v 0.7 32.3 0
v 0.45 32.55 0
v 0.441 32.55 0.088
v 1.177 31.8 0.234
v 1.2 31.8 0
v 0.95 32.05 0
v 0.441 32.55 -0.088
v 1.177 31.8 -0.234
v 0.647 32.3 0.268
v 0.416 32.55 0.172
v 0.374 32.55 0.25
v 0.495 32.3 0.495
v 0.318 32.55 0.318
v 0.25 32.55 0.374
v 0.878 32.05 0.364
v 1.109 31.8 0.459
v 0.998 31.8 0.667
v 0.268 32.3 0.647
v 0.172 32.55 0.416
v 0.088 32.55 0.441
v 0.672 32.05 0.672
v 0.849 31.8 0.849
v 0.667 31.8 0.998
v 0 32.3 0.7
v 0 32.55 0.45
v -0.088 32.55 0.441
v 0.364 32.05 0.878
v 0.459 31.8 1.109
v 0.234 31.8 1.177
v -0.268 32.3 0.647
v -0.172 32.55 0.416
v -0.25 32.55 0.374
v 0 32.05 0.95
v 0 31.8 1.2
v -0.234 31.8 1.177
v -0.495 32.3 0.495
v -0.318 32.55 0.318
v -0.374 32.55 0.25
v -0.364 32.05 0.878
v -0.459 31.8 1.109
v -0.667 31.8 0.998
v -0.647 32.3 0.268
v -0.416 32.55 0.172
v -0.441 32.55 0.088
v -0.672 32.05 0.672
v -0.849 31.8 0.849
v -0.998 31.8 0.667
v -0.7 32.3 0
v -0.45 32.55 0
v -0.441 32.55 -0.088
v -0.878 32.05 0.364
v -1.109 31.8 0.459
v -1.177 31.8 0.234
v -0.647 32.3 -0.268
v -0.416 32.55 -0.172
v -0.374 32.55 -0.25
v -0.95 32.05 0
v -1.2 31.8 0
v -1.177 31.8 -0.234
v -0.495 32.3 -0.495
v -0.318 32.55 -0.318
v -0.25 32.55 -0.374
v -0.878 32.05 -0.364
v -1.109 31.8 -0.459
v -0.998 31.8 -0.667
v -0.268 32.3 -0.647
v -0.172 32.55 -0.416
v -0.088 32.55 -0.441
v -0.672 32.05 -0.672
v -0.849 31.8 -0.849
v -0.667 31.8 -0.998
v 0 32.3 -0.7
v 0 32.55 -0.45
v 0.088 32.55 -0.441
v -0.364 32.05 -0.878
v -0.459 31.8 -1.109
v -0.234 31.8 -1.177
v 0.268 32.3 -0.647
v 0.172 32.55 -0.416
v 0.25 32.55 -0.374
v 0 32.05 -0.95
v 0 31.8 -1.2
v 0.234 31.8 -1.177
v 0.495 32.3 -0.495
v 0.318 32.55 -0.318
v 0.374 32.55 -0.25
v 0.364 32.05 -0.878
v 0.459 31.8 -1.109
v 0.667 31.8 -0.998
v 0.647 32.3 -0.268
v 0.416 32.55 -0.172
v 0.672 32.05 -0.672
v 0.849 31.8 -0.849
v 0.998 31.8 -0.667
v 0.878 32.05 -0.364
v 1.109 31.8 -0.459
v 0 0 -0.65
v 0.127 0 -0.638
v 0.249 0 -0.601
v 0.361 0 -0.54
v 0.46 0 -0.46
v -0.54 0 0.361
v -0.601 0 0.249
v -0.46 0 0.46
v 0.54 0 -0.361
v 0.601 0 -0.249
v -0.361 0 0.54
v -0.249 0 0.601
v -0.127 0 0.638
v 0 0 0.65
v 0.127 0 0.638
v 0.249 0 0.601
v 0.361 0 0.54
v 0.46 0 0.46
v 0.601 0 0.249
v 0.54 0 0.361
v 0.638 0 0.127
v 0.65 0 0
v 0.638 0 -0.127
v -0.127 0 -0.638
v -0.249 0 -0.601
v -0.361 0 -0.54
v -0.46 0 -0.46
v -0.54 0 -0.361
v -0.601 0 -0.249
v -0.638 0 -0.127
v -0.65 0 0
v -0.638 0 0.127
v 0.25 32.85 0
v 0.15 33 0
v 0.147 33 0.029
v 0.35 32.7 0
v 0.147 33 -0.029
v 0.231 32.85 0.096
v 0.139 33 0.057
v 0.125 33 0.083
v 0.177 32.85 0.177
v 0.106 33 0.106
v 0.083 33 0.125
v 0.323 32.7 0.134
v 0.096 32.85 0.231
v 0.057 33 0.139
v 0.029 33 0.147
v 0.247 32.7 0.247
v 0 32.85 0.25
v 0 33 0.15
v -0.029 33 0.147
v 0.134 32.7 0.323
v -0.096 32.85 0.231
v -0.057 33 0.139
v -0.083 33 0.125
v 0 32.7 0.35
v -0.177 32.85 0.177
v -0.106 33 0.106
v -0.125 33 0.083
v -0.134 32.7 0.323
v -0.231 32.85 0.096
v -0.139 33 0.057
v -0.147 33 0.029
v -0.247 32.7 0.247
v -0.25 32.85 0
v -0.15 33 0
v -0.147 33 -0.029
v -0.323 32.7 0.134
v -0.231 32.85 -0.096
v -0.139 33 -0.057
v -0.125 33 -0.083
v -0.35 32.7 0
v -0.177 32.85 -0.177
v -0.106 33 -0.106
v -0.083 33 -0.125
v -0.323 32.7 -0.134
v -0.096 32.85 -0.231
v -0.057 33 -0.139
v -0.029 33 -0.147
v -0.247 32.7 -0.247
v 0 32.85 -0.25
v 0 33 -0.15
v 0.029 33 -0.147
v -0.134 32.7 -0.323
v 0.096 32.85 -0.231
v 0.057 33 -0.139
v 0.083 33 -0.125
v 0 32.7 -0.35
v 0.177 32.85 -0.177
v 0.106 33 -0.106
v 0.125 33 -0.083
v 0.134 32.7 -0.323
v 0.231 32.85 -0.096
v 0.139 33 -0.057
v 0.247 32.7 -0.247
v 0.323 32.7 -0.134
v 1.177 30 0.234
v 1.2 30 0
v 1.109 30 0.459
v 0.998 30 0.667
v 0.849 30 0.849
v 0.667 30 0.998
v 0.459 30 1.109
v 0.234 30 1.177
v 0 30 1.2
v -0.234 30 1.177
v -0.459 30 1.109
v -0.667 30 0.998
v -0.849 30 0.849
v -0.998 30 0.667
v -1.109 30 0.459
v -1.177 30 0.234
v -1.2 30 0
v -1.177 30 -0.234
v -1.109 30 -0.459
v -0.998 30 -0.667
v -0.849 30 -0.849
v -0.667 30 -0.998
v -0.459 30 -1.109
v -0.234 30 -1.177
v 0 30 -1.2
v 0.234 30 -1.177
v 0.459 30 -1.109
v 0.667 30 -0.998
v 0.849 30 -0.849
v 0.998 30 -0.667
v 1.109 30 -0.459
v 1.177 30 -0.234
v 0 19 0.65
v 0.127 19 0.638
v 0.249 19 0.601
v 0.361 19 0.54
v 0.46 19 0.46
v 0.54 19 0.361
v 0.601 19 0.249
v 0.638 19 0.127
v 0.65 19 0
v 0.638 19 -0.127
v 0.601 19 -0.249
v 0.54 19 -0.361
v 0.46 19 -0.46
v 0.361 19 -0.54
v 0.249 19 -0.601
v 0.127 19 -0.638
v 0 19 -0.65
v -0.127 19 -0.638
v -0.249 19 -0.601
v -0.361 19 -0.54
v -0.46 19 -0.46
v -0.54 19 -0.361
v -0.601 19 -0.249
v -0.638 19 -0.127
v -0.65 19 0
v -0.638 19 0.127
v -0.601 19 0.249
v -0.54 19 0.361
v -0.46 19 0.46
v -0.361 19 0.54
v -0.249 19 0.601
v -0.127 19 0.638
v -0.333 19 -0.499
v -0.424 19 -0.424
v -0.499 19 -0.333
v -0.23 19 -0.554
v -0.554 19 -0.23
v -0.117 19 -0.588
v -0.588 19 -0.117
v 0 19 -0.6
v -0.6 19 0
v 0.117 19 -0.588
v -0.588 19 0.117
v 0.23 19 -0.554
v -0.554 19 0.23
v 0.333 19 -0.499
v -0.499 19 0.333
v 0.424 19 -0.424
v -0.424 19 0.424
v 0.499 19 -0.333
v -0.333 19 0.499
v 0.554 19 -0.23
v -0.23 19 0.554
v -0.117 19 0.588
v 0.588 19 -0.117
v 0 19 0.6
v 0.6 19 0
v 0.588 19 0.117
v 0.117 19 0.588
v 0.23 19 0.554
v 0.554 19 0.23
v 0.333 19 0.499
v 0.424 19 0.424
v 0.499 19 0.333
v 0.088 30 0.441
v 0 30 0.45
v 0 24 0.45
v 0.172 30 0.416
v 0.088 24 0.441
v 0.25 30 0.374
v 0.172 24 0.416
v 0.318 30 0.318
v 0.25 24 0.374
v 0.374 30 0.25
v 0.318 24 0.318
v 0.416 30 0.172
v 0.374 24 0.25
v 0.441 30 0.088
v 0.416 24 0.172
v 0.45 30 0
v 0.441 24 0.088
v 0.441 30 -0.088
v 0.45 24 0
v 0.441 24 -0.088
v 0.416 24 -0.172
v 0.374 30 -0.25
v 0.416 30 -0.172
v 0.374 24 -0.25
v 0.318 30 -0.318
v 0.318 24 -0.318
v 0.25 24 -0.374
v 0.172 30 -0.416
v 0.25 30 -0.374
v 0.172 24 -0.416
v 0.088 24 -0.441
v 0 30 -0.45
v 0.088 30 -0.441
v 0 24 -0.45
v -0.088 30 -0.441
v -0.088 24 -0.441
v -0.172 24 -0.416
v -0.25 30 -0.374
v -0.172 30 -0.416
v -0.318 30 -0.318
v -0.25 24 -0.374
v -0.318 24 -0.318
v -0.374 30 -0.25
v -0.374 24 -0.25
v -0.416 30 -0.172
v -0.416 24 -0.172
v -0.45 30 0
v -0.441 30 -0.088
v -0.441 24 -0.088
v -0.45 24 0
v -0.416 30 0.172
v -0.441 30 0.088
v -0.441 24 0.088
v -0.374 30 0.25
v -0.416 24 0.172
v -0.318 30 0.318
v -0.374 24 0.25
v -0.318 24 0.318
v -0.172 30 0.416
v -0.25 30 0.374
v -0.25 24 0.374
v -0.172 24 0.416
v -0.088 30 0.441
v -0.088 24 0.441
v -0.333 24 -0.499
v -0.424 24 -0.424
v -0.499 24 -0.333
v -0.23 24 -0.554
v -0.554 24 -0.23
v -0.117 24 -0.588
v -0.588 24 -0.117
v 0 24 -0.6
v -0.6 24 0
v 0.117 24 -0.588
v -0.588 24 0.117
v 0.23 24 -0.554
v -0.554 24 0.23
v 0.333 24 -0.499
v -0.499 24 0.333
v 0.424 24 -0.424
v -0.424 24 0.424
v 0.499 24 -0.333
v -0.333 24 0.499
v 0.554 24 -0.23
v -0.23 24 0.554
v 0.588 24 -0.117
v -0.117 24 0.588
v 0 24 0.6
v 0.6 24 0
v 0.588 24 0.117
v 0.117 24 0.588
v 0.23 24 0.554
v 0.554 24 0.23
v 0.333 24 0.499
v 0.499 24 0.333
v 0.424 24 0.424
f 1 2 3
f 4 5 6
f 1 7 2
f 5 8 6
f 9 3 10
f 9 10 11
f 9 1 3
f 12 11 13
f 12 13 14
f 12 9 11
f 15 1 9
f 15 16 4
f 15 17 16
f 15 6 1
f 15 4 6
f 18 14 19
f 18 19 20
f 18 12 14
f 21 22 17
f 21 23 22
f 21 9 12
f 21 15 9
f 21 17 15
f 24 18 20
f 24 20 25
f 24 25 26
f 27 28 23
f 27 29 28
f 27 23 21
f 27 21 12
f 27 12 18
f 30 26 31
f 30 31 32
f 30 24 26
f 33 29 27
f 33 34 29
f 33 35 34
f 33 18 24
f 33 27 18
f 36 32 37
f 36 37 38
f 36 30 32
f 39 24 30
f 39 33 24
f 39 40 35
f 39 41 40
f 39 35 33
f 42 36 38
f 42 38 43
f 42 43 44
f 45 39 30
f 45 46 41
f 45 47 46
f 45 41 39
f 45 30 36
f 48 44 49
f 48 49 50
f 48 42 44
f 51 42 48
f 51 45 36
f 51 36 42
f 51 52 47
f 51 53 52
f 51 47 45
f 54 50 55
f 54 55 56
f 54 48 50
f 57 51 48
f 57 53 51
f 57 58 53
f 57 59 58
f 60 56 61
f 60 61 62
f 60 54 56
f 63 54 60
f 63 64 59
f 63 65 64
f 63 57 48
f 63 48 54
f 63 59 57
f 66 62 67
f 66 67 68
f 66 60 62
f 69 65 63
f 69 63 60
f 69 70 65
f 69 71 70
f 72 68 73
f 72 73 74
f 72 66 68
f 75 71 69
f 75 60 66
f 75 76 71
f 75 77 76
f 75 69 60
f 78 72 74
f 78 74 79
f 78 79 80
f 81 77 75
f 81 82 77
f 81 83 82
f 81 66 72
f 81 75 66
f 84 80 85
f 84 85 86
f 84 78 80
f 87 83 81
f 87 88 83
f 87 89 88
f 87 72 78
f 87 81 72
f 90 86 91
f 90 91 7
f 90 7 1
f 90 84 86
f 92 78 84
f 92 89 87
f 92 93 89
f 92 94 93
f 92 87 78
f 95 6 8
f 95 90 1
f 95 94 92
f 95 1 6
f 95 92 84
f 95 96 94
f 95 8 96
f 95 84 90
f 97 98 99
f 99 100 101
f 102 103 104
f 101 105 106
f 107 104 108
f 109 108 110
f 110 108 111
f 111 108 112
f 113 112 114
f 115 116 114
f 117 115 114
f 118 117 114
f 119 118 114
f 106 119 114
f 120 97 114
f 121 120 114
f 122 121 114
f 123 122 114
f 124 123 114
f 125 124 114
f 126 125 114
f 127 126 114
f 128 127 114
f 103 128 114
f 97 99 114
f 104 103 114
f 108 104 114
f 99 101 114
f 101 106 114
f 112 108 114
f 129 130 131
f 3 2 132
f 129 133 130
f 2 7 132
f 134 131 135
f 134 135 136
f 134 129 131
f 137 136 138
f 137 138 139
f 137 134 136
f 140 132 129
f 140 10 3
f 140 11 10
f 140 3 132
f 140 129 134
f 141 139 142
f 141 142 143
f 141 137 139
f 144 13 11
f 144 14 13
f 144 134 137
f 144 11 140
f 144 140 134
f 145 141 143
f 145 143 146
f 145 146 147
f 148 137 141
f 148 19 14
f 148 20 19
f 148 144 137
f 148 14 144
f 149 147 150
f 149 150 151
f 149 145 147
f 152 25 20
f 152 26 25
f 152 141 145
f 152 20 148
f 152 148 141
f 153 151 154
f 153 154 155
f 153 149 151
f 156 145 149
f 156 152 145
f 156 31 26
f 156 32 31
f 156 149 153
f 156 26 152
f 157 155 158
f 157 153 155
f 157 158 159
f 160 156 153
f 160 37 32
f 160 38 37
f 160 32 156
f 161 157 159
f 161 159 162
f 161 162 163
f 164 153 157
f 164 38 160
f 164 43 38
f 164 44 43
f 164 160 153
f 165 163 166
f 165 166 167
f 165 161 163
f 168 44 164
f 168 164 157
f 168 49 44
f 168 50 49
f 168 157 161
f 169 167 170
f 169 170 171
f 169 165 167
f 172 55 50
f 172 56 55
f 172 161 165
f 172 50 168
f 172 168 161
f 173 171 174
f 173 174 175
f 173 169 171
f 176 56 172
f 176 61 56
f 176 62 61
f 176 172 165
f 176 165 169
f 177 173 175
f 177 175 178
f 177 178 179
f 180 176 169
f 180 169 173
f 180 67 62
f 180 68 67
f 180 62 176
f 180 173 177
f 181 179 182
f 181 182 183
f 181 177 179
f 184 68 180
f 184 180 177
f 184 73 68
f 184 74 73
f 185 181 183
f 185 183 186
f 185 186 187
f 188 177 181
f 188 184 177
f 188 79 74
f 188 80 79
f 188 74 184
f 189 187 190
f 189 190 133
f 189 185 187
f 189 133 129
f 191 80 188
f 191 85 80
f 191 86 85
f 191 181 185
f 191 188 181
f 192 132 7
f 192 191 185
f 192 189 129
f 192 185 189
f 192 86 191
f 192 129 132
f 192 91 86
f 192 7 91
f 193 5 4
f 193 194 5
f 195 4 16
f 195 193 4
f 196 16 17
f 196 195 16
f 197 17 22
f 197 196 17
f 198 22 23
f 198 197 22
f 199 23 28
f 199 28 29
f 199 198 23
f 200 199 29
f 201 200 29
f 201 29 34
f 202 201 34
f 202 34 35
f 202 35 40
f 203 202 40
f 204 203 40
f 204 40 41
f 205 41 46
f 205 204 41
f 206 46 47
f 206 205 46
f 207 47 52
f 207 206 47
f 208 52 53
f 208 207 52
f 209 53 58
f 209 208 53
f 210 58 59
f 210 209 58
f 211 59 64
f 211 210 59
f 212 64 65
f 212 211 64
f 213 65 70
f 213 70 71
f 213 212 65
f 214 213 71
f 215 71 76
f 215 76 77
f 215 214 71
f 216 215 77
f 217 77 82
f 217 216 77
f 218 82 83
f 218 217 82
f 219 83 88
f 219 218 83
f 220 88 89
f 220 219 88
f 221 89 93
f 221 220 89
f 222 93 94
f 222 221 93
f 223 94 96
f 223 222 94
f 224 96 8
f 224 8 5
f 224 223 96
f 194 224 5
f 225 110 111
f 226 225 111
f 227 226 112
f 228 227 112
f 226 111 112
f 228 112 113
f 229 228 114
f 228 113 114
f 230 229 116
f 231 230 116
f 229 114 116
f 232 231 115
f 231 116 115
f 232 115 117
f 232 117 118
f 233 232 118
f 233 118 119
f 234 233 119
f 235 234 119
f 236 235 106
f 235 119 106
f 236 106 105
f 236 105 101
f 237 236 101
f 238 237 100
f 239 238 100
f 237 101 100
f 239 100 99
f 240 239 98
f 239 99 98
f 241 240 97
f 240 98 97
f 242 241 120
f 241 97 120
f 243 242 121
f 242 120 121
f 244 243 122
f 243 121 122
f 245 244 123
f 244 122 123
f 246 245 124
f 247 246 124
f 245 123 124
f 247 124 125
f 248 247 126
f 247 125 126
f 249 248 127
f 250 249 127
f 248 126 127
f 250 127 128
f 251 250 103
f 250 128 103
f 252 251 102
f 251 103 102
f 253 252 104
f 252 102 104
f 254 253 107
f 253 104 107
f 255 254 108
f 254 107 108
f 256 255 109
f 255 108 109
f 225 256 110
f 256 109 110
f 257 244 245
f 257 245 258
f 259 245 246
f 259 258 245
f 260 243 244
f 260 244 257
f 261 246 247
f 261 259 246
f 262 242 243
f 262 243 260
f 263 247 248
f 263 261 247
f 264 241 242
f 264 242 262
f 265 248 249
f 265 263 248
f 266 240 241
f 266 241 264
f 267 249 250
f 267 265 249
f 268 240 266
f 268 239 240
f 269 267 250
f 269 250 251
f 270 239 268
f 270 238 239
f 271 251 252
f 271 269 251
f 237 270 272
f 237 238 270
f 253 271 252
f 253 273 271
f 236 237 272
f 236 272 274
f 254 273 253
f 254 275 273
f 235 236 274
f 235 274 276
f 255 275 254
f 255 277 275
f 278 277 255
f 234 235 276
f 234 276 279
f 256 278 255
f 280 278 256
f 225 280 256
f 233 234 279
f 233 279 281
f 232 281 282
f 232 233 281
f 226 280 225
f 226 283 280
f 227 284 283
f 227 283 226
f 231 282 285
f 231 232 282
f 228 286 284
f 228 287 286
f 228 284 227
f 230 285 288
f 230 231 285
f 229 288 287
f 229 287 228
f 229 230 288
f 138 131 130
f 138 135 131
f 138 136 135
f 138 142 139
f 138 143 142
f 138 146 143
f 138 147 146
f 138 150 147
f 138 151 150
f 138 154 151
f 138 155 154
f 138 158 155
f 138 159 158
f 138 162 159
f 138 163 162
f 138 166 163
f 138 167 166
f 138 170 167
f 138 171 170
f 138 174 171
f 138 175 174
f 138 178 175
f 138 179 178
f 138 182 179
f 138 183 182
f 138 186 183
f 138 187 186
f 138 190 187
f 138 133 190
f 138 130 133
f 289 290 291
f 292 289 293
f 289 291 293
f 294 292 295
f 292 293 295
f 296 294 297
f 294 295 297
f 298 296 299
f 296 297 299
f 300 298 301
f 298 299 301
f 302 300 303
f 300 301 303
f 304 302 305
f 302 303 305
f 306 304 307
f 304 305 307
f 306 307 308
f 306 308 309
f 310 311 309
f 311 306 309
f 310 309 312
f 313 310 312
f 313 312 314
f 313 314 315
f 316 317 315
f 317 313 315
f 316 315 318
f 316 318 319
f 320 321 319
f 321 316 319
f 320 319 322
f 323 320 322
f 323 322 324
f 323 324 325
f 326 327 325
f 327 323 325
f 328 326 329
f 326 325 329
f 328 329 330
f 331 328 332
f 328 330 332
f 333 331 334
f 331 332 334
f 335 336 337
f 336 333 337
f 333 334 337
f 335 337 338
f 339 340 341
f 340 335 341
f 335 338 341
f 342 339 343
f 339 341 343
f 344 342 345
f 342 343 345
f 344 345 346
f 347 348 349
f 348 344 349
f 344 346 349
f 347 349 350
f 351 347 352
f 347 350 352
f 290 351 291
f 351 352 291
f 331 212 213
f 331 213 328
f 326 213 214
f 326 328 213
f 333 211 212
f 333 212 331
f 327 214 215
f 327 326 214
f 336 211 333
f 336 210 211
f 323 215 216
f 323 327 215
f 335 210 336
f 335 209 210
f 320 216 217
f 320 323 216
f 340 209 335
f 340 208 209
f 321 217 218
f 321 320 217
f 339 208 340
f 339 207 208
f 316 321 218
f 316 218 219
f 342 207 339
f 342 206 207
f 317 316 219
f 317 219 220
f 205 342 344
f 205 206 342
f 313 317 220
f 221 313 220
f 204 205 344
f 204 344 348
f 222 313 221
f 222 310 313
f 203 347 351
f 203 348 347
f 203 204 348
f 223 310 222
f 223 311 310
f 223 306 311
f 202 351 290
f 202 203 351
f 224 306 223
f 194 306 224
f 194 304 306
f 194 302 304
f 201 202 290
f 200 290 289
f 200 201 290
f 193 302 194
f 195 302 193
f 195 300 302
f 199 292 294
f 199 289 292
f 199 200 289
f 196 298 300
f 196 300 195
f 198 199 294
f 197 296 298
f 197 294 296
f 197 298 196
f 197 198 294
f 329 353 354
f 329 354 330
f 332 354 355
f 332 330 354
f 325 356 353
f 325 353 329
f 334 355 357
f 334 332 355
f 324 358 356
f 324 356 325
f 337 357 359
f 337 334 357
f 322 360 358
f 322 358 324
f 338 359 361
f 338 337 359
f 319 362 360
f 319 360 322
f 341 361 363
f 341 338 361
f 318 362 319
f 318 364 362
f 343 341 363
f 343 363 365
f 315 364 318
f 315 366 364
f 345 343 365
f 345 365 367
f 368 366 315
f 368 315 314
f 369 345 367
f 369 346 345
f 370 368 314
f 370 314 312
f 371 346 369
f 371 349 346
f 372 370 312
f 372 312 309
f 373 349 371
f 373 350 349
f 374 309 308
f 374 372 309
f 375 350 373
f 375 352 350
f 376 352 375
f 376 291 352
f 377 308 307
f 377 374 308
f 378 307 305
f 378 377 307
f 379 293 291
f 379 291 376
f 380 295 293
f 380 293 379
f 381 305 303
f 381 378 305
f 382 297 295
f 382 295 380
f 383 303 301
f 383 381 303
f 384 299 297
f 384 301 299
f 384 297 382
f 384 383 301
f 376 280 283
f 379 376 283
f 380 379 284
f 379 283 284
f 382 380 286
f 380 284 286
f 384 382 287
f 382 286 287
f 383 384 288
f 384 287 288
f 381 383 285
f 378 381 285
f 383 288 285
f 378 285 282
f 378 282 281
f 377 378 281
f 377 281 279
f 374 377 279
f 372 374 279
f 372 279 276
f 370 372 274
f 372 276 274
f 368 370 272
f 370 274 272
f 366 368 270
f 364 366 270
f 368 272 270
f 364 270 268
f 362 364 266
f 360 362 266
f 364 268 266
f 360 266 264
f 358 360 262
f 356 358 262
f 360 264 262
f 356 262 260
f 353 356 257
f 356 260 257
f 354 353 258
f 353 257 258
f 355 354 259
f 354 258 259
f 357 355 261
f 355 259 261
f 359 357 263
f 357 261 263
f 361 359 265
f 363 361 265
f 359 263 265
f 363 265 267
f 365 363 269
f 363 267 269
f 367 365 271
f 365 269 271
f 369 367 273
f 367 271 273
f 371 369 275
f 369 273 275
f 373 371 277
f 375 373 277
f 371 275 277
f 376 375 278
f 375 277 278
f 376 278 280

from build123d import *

# Parameters (mm, degrees)
SKETCH_1_R      = 0.65
EXTRUDE_1_DEPTH = 19
SKETCH_2_R      = 0.6
EXTRUDE_2_DEPTH = 5
SKETCH_3_R      = 0.45
EXTRUDE_3_DEPTH = 9


with BuildPart() as part:
    # 草图1 → 凸台-拉伸1 (new body)
    with BuildSketch(Plane(origin=(0, 0, 0), x_dir=(1, 0, 0), z_dir=(0, 1, 0))):
        with Locations(Location((0, 0, 0), (0, 0, 270))):
            Circle(SKETCH_1_R)
    extrude(amount=EXTRUDE_1_DEPTH)

    # 草图2 → 凸台-拉伸2 (add)
    with BuildSketch(Plane(origin=(0, 19, 0), x_dir=(1, 0, 0), z_dir=(0, 1, 0))):
        with Locations(Location((0, 0, 0), (0, 0, 270))):
            Circle(SKETCH_2_R)
    extrude(amount=EXTRUDE_2_DEPTH)

    # 草图3 → 凸台-拉伸3 (add)
    with BuildSketch(Plane(origin=(0, 24, 0), x_dir=(1, 0, 0), z_dir=(0, 1, 0))):
        with Locations(Location((0, 0, 0), (0, 0, 270))):
            Circle(SKETCH_3_R)
    extrude(amount=EXTRUDE_3_DEPTH)

    # 草图6 → 旋转2 (revolve)
    with BuildSketch(Plane.XY, mode=Mode.PRIVATE) as revolve_2_sk:
        Polygon((0, 33), (-1.2, 31.8), (-1.2, 30), (0, 30), align=None)
    revolve(revolve_2_sk.sketch.rotate(Axis((0, 0, 0), (0, -1, 0)), 180), axis=Axis((0, 0, 0), (0, -1, 0)))

    # 草图7 → 切除-旋转5 (revolve, cut)
    with BuildSketch(Plane.XY):
        Polygon((0.45, 33), (0.15, 33), (0.45, 32.55), align=None)
    revolve(axis=Axis((0, 0, 0), (0, -1, 0)), mode=Mode.SUBTRACT)


solid = part.part
